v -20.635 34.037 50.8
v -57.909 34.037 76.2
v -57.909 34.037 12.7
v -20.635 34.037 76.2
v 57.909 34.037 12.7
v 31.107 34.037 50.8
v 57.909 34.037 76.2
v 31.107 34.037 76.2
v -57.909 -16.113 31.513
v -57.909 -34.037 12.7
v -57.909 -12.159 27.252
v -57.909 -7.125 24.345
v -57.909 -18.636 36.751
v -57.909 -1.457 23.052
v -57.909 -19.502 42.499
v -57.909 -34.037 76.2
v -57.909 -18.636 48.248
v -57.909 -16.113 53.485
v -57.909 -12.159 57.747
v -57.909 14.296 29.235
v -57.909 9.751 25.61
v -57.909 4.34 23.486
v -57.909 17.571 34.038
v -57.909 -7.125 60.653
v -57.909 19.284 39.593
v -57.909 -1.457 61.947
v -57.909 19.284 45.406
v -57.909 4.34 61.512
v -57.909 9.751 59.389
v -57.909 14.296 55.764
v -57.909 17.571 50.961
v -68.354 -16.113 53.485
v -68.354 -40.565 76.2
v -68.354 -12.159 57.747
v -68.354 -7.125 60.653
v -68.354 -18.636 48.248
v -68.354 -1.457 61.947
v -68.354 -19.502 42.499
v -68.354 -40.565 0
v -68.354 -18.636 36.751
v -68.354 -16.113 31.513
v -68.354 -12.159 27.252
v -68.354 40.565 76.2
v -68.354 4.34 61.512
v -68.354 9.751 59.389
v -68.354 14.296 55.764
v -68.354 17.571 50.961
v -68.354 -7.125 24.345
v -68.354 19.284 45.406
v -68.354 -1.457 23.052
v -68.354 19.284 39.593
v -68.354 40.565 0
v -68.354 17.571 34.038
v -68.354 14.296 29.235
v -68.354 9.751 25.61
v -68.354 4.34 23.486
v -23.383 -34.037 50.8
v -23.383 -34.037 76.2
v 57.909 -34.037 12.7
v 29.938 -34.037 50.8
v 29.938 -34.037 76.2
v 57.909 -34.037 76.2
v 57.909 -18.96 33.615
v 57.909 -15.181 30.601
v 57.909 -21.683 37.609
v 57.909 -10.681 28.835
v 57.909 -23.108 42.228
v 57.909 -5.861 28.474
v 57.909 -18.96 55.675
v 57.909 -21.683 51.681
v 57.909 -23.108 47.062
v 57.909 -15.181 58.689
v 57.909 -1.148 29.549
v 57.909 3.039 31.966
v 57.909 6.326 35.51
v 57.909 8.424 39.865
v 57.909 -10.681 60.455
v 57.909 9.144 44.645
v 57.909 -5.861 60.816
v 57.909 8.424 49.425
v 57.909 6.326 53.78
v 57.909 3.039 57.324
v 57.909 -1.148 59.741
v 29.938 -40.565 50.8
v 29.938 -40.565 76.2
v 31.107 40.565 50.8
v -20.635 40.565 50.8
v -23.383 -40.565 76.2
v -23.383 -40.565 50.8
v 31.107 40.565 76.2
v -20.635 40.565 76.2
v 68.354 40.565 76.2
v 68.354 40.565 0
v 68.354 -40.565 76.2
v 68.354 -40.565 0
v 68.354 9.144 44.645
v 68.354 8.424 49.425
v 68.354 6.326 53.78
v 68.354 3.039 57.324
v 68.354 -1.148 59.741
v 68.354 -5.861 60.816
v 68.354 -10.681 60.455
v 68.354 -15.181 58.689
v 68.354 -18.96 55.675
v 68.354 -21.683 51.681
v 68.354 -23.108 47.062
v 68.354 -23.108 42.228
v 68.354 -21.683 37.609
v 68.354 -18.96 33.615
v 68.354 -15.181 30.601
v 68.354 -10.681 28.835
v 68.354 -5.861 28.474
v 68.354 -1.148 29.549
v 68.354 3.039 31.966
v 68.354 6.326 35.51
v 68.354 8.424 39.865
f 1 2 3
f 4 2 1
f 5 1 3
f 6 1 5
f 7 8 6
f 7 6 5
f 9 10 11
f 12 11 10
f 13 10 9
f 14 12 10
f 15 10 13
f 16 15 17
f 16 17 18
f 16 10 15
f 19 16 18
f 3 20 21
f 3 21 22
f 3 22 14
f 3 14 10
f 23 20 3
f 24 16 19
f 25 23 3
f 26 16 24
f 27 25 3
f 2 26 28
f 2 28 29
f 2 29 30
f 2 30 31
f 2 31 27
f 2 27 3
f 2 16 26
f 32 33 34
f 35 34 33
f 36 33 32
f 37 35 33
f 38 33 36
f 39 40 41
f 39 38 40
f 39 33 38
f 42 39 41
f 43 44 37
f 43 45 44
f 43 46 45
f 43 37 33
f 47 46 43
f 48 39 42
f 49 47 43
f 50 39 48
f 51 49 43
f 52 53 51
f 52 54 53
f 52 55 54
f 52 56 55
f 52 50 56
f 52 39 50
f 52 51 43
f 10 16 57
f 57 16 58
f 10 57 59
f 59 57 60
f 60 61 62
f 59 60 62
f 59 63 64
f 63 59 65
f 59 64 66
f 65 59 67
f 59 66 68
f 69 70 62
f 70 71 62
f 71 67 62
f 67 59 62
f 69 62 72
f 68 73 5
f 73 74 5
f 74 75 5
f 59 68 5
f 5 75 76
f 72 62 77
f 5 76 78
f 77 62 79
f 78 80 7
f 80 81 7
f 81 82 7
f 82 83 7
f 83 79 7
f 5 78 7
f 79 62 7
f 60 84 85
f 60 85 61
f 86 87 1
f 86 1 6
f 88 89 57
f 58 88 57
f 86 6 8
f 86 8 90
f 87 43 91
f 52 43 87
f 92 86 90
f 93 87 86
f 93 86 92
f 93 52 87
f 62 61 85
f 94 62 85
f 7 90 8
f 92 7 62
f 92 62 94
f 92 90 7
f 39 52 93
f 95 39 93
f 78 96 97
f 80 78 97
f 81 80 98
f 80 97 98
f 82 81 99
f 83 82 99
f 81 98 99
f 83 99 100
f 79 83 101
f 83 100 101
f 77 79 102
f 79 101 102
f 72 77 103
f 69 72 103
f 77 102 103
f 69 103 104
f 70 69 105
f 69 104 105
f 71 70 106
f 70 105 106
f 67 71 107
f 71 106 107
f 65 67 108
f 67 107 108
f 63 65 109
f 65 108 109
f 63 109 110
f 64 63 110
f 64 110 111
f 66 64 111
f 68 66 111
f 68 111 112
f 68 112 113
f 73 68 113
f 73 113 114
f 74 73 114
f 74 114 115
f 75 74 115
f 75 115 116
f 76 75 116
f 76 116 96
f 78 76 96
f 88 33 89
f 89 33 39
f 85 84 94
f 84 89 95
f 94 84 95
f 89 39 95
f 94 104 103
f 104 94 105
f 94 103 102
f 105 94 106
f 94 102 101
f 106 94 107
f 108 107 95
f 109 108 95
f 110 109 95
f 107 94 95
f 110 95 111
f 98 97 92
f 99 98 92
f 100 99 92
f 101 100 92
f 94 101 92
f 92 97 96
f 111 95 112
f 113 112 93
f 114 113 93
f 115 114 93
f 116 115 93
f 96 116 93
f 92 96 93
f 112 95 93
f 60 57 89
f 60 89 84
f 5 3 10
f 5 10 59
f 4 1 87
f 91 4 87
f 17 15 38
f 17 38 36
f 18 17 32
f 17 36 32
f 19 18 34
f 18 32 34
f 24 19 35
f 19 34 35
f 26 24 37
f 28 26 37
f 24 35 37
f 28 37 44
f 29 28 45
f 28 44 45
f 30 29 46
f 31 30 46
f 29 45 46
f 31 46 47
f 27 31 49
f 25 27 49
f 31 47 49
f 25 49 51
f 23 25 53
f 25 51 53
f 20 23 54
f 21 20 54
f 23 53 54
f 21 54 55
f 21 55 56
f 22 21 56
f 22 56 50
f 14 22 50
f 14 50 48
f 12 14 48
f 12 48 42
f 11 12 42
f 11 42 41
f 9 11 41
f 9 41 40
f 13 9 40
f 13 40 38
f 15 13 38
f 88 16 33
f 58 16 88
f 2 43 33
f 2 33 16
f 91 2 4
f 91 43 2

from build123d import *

# Parameters (mm, degrees)
F0_W      = 136.7070674896
F0_H      = 81.1290219426
F1_DEPTH  = 76.2
F2_W      = 115.8186718822
F2_H      = 68.073771894
F3_DEPTH  = 63.5
F4_W      = 51.7421588302
F4_H      = 6.5276250243
F5_DEPTH  = 25.4
F6_W      = 53.3207450062
F6_H      = 6.5276250243
F7_DEPTH  = 25.4
F8_R      = 19.5019980074
F9_DEPTH  = 25.4
F10_R     = 16.2167518515
F11_DEPTH = 25.4


with BuildPart() as f1:
    # F0 (on Top) → F1 (new body)
    with BuildSketch(Plane.XY):
        Rectangle(F0_W, F0_H)
    extrude(amount=F1_DEPTH)

    # F2 (on face) → F3 (cut)
    with BuildSketch(Plane.XY.offset(76.2)):
        Rectangle(F2_W, F2_H)
    extrude(amount=-F3_DEPTH, mode=Mode.SUBTRACT)

    # F4 (on face) → F5 (cut)
    with BuildSketch(Plane.XY.offset(76.2)):
        with Locations((5.2360128611, 37.3006984591)):
            Rectangle(F4_W, F4_H)
    extrude(amount=-F5_DEPTH, mode=Mode.SUBTRACT)

    # F6 (on face) → F7 (cut)
    with BuildSketch(Plane.XY.offset(76.2)):
        with Locations((3.2774237916, -37.3006984591)):
            Rectangle(F6_W, F6_H)
    extrude(amount=-F7_DEPTH, mode=Mode.SUBTRACT)

    # F8 (on face) → F9 (cut)
    with BuildSketch(Plane(origin=(-68.3535337448, 0, 0), x_dir=(0, -1, 0), z_dir=(-1, 0, 0))):
        with Locations((0, 42.4992851913)):
            Circle(F8_R)
    extrude(amount=-F9_DEPTH, mode=Mode.SUBTRACT)

    # F10 (on face) → F11 (cut)
    with BuildSketch(Plane.YZ.offset(68.3535337448)):
        with Locations((-7.0724547841, 44.6449071169)):
            Circle(F10_R)
    extrude(amount=-F11_DEPTH, mode=Mode.SUBTRACT)


solid = f1.part
